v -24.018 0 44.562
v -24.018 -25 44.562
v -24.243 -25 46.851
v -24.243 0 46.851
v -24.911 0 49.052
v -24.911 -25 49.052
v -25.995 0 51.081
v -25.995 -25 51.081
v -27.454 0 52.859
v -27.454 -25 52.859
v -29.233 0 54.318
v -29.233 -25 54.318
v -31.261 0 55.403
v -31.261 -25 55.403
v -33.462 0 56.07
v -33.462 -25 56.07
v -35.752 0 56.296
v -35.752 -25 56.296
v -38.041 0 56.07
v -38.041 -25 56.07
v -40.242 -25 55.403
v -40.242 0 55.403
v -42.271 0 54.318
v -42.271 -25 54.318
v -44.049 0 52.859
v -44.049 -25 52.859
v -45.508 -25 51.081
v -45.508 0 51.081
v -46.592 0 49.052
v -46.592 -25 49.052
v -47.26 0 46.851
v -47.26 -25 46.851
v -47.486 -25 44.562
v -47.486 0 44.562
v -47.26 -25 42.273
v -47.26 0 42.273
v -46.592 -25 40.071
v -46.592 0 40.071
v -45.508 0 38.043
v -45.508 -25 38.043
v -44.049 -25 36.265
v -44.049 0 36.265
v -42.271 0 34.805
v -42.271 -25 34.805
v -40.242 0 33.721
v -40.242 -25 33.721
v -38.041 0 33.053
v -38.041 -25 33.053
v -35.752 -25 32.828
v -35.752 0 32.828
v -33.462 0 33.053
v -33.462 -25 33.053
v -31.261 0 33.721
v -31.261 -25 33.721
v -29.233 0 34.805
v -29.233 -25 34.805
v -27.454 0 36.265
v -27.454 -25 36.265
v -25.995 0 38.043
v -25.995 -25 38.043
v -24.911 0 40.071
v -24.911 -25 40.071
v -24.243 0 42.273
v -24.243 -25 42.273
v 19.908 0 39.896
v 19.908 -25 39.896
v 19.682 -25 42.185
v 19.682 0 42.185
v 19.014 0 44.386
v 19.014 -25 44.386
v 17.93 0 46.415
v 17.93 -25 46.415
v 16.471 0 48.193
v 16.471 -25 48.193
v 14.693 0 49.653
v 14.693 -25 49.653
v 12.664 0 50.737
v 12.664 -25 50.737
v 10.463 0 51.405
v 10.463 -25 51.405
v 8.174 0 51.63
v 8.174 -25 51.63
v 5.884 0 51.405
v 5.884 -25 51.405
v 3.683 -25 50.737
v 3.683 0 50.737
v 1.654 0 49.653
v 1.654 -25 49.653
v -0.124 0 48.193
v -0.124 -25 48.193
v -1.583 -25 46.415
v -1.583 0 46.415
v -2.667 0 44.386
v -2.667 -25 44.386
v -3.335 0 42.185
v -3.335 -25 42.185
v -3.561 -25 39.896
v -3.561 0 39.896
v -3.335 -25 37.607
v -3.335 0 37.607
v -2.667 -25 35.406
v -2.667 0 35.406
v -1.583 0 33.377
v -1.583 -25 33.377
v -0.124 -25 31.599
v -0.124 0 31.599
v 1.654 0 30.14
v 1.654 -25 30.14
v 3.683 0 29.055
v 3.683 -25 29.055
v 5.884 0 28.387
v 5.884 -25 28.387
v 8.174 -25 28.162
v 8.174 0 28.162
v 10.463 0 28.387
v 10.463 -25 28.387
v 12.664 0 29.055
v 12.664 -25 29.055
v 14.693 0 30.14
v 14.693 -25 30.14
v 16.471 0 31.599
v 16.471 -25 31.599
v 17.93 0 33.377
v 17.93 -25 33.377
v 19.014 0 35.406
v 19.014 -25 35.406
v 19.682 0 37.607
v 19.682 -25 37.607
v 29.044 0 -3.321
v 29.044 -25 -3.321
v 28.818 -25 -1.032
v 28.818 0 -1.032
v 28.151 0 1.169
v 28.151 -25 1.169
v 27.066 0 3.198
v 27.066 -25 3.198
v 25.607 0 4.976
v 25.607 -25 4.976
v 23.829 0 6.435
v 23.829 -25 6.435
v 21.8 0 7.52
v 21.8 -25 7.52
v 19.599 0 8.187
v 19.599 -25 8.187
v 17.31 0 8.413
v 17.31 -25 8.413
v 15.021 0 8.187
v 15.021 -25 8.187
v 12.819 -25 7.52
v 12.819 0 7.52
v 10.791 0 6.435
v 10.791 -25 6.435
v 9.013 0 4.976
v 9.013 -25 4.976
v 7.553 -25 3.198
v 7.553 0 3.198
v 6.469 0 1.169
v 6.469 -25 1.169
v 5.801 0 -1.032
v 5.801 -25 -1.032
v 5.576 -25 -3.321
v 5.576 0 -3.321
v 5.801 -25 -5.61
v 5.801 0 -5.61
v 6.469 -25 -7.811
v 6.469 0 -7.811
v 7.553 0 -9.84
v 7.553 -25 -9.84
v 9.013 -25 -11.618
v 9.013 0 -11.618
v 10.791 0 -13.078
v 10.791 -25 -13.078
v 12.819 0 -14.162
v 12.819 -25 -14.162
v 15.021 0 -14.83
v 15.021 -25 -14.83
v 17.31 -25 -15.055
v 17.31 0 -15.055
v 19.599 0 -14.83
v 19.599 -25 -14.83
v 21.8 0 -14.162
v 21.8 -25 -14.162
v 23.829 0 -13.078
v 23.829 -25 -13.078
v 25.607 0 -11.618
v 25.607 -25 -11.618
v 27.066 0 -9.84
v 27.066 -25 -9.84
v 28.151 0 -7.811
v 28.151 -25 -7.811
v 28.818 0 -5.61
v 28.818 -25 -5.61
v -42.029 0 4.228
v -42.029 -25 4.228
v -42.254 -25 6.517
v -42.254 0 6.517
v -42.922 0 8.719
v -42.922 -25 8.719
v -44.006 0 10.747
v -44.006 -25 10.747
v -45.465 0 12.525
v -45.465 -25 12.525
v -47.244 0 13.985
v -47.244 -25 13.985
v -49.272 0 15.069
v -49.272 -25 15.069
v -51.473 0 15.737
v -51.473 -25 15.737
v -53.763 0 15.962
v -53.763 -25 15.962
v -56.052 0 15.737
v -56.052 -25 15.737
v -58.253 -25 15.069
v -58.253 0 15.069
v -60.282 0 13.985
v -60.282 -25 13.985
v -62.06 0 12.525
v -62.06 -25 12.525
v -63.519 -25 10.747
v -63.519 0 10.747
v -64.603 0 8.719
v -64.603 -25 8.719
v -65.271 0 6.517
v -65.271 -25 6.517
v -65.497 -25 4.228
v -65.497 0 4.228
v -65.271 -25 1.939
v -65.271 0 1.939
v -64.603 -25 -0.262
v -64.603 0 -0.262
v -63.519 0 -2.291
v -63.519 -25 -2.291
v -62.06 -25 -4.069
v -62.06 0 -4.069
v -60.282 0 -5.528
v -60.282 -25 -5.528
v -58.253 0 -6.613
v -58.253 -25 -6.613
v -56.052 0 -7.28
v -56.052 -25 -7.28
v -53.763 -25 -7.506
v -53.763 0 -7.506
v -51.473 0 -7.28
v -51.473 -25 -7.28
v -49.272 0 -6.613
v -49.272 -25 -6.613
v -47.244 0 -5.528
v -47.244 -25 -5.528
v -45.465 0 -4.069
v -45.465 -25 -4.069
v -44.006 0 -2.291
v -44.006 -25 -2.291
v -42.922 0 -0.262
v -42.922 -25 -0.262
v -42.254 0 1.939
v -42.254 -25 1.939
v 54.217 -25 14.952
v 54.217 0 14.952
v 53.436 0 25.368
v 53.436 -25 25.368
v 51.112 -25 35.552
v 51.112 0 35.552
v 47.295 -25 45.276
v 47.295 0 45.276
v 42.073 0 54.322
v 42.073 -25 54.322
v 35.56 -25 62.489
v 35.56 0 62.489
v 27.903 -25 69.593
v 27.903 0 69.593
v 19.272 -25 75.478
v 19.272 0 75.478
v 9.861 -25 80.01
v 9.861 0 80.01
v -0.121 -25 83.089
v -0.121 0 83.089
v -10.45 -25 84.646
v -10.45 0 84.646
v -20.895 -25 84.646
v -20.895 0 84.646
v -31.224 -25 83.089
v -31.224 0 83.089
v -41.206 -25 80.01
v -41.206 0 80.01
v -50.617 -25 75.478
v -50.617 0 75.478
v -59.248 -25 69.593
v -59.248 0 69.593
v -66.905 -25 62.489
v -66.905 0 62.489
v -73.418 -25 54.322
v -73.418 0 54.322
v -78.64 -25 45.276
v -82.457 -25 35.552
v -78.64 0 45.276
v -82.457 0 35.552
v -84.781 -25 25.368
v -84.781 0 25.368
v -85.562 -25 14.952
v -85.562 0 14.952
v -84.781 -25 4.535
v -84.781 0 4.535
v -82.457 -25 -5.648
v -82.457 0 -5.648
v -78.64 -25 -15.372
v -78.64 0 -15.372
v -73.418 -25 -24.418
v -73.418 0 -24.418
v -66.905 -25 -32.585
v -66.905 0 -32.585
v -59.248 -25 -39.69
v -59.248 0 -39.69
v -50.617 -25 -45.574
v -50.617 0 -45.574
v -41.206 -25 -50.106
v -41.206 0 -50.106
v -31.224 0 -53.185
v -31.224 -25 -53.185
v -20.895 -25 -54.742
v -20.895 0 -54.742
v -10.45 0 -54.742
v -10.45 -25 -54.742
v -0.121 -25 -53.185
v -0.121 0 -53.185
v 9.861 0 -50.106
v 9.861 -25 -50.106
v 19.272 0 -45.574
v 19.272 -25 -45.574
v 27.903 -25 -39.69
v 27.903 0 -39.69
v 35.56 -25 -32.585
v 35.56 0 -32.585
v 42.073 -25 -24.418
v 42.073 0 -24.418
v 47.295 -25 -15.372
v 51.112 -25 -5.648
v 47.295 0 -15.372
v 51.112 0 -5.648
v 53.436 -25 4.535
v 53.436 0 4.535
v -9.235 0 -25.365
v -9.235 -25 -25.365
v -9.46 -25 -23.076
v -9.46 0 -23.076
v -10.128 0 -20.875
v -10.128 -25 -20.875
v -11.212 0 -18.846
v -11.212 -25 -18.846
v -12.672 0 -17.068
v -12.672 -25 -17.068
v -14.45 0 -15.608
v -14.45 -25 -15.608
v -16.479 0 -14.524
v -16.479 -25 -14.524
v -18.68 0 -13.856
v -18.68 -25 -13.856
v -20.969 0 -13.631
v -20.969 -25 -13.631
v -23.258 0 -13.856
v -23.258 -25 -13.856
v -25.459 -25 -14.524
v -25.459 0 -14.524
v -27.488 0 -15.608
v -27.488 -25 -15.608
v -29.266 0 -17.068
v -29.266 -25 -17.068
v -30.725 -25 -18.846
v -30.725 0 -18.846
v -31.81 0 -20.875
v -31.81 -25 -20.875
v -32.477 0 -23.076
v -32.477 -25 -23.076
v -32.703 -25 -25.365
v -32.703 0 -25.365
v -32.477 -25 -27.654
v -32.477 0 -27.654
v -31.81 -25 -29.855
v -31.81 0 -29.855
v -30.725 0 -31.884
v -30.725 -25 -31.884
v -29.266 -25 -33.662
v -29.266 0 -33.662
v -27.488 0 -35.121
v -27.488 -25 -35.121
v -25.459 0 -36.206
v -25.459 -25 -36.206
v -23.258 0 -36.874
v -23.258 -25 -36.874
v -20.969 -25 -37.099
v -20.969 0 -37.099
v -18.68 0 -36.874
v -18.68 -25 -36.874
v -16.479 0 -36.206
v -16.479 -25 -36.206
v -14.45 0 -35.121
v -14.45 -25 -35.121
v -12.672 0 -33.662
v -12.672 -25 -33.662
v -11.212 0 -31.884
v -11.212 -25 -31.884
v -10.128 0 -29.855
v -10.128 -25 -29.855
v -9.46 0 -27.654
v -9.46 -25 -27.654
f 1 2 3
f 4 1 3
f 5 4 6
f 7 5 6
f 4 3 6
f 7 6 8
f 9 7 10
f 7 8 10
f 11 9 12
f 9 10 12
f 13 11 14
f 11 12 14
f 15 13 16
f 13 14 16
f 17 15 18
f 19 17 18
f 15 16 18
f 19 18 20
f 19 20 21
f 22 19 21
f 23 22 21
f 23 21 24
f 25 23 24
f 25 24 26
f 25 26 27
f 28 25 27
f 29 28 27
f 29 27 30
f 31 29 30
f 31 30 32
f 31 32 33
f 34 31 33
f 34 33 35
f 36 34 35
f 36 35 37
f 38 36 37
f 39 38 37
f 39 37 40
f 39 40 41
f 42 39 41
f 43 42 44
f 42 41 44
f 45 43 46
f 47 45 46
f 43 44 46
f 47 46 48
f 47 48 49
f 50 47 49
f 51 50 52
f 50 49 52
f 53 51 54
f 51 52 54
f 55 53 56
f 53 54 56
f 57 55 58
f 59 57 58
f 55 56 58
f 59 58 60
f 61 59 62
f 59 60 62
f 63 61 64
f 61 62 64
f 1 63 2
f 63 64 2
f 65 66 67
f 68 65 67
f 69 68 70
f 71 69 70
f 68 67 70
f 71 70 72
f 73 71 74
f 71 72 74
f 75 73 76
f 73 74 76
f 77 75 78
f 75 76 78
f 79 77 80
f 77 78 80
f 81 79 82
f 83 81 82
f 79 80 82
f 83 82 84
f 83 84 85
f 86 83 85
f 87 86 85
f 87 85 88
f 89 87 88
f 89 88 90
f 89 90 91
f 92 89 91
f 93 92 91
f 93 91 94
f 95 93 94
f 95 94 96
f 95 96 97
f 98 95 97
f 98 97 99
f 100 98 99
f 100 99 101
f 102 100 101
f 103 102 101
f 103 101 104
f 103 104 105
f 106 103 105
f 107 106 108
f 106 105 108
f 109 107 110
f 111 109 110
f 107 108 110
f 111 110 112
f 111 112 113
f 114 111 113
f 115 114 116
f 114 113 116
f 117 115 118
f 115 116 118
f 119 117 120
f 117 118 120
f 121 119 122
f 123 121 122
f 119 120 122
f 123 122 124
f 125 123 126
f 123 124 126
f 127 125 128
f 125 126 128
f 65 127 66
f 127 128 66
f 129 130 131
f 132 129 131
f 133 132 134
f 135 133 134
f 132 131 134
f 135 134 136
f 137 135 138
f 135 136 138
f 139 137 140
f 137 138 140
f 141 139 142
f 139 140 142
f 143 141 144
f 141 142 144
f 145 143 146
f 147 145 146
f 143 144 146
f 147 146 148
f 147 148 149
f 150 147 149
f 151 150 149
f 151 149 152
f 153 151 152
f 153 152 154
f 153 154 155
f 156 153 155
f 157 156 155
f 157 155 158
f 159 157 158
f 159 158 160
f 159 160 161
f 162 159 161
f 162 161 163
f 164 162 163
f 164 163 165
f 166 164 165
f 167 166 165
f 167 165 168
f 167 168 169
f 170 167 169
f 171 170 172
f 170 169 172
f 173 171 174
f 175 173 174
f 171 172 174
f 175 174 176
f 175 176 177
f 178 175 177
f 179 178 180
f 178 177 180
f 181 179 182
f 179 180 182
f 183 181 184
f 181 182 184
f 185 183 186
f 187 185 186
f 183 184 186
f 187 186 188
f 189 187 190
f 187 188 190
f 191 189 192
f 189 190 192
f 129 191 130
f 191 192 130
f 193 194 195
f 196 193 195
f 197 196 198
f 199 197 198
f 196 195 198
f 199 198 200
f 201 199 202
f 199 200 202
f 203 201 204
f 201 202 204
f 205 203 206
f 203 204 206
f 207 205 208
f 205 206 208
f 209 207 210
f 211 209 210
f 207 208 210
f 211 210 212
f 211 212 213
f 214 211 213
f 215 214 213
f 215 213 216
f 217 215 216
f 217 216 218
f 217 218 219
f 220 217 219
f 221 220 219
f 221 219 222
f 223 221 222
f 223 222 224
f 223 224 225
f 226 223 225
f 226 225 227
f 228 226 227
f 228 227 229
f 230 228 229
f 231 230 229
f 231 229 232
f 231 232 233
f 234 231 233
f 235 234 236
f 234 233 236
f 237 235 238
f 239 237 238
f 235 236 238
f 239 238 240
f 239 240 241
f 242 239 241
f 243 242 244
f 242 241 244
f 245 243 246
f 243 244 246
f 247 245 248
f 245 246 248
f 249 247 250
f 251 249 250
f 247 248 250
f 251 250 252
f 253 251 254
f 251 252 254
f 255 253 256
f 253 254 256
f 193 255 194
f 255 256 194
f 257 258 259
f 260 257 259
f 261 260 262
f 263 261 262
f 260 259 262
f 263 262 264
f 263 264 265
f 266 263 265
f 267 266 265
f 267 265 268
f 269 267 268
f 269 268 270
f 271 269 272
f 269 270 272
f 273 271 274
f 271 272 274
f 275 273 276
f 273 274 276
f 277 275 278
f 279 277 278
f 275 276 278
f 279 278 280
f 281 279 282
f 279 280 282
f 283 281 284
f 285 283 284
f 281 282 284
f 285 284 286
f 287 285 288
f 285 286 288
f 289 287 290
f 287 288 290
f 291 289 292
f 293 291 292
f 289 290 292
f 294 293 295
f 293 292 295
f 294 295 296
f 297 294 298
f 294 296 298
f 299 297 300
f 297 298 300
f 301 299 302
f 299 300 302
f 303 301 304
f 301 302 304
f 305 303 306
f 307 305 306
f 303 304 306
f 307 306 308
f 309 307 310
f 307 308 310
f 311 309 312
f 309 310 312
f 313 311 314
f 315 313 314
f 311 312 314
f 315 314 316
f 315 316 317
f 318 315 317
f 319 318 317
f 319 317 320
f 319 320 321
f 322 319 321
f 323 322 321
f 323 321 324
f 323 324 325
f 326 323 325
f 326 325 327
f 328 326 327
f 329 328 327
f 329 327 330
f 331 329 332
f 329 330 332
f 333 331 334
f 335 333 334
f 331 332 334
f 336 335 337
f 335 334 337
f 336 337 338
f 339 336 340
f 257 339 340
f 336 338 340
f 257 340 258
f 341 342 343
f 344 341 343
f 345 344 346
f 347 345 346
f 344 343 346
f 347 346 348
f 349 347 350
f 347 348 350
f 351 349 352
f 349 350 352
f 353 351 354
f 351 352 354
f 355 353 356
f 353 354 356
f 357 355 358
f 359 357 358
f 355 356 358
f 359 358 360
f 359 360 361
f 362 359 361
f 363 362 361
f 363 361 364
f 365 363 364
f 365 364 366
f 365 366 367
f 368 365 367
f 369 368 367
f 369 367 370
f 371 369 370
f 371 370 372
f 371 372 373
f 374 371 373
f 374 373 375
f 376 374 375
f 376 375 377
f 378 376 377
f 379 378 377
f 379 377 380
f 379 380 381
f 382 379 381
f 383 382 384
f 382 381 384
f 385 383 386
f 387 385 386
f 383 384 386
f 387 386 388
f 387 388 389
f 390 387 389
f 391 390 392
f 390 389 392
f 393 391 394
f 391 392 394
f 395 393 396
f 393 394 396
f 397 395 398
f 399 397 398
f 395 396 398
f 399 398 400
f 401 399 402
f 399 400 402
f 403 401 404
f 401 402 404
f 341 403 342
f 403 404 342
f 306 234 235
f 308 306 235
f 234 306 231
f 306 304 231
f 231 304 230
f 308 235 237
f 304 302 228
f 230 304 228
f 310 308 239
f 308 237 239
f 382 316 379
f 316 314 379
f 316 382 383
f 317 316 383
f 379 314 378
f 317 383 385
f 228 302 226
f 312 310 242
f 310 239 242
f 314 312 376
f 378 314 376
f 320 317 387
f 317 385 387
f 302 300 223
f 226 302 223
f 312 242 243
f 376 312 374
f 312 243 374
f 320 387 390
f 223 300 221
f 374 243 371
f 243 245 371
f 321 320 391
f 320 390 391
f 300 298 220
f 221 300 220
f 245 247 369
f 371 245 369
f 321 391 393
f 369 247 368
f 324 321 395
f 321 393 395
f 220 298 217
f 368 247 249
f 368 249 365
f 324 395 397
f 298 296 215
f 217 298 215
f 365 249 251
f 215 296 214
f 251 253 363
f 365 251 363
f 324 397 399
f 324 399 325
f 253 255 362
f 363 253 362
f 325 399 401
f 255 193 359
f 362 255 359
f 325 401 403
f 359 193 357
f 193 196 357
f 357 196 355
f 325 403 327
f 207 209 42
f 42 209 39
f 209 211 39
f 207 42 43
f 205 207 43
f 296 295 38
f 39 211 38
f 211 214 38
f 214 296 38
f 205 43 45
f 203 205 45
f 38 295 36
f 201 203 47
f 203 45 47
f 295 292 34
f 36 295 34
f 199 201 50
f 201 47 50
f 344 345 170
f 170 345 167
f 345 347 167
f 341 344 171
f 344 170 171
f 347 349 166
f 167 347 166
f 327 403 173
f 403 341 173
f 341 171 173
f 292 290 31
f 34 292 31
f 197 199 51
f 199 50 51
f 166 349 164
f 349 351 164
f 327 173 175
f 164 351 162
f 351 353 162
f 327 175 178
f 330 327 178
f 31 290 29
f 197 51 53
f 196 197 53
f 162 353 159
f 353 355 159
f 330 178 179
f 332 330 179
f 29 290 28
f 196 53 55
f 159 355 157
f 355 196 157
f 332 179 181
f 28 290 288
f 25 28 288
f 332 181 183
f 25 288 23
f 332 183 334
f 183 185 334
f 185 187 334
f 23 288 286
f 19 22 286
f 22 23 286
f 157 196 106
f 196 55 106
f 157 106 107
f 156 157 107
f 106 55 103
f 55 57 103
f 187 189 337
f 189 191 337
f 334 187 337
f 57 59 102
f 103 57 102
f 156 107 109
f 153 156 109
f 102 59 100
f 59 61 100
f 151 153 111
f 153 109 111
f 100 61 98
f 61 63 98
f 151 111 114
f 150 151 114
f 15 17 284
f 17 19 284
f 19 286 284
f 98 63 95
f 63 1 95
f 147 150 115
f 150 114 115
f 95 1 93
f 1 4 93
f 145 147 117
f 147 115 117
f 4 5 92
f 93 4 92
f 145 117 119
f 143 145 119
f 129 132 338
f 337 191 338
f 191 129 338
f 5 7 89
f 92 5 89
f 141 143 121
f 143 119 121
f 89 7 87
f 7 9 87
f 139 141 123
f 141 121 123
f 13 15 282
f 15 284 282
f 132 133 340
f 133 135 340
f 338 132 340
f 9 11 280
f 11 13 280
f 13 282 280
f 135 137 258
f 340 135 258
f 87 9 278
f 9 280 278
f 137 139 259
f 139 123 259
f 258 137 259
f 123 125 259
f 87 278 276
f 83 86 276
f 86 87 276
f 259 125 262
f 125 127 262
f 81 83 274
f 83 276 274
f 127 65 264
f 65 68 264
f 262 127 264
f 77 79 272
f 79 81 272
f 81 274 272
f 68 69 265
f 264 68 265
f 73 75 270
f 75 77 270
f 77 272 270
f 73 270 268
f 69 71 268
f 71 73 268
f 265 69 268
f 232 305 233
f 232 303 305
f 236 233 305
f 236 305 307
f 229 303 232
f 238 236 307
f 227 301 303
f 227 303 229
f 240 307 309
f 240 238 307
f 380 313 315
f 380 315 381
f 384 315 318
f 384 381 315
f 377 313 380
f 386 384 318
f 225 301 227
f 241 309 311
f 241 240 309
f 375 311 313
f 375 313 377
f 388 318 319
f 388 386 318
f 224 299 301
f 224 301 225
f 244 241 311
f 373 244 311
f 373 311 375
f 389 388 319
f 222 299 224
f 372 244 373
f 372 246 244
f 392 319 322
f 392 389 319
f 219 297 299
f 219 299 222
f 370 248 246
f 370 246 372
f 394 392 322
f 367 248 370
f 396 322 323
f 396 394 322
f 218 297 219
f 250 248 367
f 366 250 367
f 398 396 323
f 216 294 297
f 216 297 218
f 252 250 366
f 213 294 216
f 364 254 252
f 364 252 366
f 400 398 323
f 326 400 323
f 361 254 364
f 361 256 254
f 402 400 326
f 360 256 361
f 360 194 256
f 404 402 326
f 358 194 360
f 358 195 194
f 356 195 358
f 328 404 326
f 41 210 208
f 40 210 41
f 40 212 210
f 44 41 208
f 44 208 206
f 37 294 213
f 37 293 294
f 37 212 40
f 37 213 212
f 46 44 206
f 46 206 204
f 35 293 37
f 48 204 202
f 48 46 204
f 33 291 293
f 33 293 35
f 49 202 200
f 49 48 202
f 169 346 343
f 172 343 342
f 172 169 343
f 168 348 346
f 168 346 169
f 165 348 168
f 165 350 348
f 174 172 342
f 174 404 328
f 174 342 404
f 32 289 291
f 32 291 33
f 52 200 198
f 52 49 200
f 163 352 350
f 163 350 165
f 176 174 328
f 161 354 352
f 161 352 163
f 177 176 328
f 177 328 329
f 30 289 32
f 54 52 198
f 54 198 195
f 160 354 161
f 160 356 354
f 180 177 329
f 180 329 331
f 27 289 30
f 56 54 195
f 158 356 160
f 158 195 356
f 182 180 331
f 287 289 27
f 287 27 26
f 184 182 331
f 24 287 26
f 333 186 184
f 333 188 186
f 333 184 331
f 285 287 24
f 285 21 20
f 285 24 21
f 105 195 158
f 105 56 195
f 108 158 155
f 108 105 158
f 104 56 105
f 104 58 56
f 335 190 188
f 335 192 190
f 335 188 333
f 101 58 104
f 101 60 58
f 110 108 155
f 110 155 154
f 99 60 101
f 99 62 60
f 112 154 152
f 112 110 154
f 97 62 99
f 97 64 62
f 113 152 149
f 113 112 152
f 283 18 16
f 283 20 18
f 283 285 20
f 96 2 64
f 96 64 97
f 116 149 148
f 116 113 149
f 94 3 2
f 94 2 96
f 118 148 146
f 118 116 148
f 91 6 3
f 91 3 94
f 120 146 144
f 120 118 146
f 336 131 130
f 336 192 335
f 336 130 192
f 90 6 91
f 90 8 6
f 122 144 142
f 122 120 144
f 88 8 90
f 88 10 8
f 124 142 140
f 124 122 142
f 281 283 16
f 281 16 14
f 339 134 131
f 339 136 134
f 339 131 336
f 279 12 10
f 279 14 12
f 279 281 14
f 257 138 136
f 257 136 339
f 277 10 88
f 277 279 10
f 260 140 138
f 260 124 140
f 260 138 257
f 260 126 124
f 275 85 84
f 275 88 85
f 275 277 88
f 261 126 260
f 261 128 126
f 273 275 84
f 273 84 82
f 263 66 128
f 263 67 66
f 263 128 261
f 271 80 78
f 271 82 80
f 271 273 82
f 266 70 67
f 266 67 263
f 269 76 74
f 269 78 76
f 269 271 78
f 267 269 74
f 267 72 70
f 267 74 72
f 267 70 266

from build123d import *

# Parameters (mm, degrees)
F0_R     = 69.889074
F1_DEPTH = 25
F2_R     = 11.734022
F3_DEPTH = 77


with BuildPart() as f1:
    # F0 (on Front) → F1 (new body)
    with BuildSketch(Plane.XZ):
        with Locations((-15.672464, 14.951888)):
            Circle(F0_R)
    extrude(amount=F1_DEPTH)

    # F2 (on face) → F3 (cut)
    with BuildSketch(Plane.XZ.offset(25)):
        with Locations((-35.751652, 44.561766)):
            Circle(F2_R)
        with Locations((-53.762659, 4.228258)):
            Circle(F2_R)
        with Locations((-20.968921, -25.364967)):
            Circle(F2_R)
        with Locations((17.309731, -3.321078)):
            Circle(F2_R)
        with Locations((8.173501, 39.89602)):
            Circle(F2_R)
    extrude(amount=-F3_DEPTH, mode=Mode.SUBTRACT)


solid = f1.part
